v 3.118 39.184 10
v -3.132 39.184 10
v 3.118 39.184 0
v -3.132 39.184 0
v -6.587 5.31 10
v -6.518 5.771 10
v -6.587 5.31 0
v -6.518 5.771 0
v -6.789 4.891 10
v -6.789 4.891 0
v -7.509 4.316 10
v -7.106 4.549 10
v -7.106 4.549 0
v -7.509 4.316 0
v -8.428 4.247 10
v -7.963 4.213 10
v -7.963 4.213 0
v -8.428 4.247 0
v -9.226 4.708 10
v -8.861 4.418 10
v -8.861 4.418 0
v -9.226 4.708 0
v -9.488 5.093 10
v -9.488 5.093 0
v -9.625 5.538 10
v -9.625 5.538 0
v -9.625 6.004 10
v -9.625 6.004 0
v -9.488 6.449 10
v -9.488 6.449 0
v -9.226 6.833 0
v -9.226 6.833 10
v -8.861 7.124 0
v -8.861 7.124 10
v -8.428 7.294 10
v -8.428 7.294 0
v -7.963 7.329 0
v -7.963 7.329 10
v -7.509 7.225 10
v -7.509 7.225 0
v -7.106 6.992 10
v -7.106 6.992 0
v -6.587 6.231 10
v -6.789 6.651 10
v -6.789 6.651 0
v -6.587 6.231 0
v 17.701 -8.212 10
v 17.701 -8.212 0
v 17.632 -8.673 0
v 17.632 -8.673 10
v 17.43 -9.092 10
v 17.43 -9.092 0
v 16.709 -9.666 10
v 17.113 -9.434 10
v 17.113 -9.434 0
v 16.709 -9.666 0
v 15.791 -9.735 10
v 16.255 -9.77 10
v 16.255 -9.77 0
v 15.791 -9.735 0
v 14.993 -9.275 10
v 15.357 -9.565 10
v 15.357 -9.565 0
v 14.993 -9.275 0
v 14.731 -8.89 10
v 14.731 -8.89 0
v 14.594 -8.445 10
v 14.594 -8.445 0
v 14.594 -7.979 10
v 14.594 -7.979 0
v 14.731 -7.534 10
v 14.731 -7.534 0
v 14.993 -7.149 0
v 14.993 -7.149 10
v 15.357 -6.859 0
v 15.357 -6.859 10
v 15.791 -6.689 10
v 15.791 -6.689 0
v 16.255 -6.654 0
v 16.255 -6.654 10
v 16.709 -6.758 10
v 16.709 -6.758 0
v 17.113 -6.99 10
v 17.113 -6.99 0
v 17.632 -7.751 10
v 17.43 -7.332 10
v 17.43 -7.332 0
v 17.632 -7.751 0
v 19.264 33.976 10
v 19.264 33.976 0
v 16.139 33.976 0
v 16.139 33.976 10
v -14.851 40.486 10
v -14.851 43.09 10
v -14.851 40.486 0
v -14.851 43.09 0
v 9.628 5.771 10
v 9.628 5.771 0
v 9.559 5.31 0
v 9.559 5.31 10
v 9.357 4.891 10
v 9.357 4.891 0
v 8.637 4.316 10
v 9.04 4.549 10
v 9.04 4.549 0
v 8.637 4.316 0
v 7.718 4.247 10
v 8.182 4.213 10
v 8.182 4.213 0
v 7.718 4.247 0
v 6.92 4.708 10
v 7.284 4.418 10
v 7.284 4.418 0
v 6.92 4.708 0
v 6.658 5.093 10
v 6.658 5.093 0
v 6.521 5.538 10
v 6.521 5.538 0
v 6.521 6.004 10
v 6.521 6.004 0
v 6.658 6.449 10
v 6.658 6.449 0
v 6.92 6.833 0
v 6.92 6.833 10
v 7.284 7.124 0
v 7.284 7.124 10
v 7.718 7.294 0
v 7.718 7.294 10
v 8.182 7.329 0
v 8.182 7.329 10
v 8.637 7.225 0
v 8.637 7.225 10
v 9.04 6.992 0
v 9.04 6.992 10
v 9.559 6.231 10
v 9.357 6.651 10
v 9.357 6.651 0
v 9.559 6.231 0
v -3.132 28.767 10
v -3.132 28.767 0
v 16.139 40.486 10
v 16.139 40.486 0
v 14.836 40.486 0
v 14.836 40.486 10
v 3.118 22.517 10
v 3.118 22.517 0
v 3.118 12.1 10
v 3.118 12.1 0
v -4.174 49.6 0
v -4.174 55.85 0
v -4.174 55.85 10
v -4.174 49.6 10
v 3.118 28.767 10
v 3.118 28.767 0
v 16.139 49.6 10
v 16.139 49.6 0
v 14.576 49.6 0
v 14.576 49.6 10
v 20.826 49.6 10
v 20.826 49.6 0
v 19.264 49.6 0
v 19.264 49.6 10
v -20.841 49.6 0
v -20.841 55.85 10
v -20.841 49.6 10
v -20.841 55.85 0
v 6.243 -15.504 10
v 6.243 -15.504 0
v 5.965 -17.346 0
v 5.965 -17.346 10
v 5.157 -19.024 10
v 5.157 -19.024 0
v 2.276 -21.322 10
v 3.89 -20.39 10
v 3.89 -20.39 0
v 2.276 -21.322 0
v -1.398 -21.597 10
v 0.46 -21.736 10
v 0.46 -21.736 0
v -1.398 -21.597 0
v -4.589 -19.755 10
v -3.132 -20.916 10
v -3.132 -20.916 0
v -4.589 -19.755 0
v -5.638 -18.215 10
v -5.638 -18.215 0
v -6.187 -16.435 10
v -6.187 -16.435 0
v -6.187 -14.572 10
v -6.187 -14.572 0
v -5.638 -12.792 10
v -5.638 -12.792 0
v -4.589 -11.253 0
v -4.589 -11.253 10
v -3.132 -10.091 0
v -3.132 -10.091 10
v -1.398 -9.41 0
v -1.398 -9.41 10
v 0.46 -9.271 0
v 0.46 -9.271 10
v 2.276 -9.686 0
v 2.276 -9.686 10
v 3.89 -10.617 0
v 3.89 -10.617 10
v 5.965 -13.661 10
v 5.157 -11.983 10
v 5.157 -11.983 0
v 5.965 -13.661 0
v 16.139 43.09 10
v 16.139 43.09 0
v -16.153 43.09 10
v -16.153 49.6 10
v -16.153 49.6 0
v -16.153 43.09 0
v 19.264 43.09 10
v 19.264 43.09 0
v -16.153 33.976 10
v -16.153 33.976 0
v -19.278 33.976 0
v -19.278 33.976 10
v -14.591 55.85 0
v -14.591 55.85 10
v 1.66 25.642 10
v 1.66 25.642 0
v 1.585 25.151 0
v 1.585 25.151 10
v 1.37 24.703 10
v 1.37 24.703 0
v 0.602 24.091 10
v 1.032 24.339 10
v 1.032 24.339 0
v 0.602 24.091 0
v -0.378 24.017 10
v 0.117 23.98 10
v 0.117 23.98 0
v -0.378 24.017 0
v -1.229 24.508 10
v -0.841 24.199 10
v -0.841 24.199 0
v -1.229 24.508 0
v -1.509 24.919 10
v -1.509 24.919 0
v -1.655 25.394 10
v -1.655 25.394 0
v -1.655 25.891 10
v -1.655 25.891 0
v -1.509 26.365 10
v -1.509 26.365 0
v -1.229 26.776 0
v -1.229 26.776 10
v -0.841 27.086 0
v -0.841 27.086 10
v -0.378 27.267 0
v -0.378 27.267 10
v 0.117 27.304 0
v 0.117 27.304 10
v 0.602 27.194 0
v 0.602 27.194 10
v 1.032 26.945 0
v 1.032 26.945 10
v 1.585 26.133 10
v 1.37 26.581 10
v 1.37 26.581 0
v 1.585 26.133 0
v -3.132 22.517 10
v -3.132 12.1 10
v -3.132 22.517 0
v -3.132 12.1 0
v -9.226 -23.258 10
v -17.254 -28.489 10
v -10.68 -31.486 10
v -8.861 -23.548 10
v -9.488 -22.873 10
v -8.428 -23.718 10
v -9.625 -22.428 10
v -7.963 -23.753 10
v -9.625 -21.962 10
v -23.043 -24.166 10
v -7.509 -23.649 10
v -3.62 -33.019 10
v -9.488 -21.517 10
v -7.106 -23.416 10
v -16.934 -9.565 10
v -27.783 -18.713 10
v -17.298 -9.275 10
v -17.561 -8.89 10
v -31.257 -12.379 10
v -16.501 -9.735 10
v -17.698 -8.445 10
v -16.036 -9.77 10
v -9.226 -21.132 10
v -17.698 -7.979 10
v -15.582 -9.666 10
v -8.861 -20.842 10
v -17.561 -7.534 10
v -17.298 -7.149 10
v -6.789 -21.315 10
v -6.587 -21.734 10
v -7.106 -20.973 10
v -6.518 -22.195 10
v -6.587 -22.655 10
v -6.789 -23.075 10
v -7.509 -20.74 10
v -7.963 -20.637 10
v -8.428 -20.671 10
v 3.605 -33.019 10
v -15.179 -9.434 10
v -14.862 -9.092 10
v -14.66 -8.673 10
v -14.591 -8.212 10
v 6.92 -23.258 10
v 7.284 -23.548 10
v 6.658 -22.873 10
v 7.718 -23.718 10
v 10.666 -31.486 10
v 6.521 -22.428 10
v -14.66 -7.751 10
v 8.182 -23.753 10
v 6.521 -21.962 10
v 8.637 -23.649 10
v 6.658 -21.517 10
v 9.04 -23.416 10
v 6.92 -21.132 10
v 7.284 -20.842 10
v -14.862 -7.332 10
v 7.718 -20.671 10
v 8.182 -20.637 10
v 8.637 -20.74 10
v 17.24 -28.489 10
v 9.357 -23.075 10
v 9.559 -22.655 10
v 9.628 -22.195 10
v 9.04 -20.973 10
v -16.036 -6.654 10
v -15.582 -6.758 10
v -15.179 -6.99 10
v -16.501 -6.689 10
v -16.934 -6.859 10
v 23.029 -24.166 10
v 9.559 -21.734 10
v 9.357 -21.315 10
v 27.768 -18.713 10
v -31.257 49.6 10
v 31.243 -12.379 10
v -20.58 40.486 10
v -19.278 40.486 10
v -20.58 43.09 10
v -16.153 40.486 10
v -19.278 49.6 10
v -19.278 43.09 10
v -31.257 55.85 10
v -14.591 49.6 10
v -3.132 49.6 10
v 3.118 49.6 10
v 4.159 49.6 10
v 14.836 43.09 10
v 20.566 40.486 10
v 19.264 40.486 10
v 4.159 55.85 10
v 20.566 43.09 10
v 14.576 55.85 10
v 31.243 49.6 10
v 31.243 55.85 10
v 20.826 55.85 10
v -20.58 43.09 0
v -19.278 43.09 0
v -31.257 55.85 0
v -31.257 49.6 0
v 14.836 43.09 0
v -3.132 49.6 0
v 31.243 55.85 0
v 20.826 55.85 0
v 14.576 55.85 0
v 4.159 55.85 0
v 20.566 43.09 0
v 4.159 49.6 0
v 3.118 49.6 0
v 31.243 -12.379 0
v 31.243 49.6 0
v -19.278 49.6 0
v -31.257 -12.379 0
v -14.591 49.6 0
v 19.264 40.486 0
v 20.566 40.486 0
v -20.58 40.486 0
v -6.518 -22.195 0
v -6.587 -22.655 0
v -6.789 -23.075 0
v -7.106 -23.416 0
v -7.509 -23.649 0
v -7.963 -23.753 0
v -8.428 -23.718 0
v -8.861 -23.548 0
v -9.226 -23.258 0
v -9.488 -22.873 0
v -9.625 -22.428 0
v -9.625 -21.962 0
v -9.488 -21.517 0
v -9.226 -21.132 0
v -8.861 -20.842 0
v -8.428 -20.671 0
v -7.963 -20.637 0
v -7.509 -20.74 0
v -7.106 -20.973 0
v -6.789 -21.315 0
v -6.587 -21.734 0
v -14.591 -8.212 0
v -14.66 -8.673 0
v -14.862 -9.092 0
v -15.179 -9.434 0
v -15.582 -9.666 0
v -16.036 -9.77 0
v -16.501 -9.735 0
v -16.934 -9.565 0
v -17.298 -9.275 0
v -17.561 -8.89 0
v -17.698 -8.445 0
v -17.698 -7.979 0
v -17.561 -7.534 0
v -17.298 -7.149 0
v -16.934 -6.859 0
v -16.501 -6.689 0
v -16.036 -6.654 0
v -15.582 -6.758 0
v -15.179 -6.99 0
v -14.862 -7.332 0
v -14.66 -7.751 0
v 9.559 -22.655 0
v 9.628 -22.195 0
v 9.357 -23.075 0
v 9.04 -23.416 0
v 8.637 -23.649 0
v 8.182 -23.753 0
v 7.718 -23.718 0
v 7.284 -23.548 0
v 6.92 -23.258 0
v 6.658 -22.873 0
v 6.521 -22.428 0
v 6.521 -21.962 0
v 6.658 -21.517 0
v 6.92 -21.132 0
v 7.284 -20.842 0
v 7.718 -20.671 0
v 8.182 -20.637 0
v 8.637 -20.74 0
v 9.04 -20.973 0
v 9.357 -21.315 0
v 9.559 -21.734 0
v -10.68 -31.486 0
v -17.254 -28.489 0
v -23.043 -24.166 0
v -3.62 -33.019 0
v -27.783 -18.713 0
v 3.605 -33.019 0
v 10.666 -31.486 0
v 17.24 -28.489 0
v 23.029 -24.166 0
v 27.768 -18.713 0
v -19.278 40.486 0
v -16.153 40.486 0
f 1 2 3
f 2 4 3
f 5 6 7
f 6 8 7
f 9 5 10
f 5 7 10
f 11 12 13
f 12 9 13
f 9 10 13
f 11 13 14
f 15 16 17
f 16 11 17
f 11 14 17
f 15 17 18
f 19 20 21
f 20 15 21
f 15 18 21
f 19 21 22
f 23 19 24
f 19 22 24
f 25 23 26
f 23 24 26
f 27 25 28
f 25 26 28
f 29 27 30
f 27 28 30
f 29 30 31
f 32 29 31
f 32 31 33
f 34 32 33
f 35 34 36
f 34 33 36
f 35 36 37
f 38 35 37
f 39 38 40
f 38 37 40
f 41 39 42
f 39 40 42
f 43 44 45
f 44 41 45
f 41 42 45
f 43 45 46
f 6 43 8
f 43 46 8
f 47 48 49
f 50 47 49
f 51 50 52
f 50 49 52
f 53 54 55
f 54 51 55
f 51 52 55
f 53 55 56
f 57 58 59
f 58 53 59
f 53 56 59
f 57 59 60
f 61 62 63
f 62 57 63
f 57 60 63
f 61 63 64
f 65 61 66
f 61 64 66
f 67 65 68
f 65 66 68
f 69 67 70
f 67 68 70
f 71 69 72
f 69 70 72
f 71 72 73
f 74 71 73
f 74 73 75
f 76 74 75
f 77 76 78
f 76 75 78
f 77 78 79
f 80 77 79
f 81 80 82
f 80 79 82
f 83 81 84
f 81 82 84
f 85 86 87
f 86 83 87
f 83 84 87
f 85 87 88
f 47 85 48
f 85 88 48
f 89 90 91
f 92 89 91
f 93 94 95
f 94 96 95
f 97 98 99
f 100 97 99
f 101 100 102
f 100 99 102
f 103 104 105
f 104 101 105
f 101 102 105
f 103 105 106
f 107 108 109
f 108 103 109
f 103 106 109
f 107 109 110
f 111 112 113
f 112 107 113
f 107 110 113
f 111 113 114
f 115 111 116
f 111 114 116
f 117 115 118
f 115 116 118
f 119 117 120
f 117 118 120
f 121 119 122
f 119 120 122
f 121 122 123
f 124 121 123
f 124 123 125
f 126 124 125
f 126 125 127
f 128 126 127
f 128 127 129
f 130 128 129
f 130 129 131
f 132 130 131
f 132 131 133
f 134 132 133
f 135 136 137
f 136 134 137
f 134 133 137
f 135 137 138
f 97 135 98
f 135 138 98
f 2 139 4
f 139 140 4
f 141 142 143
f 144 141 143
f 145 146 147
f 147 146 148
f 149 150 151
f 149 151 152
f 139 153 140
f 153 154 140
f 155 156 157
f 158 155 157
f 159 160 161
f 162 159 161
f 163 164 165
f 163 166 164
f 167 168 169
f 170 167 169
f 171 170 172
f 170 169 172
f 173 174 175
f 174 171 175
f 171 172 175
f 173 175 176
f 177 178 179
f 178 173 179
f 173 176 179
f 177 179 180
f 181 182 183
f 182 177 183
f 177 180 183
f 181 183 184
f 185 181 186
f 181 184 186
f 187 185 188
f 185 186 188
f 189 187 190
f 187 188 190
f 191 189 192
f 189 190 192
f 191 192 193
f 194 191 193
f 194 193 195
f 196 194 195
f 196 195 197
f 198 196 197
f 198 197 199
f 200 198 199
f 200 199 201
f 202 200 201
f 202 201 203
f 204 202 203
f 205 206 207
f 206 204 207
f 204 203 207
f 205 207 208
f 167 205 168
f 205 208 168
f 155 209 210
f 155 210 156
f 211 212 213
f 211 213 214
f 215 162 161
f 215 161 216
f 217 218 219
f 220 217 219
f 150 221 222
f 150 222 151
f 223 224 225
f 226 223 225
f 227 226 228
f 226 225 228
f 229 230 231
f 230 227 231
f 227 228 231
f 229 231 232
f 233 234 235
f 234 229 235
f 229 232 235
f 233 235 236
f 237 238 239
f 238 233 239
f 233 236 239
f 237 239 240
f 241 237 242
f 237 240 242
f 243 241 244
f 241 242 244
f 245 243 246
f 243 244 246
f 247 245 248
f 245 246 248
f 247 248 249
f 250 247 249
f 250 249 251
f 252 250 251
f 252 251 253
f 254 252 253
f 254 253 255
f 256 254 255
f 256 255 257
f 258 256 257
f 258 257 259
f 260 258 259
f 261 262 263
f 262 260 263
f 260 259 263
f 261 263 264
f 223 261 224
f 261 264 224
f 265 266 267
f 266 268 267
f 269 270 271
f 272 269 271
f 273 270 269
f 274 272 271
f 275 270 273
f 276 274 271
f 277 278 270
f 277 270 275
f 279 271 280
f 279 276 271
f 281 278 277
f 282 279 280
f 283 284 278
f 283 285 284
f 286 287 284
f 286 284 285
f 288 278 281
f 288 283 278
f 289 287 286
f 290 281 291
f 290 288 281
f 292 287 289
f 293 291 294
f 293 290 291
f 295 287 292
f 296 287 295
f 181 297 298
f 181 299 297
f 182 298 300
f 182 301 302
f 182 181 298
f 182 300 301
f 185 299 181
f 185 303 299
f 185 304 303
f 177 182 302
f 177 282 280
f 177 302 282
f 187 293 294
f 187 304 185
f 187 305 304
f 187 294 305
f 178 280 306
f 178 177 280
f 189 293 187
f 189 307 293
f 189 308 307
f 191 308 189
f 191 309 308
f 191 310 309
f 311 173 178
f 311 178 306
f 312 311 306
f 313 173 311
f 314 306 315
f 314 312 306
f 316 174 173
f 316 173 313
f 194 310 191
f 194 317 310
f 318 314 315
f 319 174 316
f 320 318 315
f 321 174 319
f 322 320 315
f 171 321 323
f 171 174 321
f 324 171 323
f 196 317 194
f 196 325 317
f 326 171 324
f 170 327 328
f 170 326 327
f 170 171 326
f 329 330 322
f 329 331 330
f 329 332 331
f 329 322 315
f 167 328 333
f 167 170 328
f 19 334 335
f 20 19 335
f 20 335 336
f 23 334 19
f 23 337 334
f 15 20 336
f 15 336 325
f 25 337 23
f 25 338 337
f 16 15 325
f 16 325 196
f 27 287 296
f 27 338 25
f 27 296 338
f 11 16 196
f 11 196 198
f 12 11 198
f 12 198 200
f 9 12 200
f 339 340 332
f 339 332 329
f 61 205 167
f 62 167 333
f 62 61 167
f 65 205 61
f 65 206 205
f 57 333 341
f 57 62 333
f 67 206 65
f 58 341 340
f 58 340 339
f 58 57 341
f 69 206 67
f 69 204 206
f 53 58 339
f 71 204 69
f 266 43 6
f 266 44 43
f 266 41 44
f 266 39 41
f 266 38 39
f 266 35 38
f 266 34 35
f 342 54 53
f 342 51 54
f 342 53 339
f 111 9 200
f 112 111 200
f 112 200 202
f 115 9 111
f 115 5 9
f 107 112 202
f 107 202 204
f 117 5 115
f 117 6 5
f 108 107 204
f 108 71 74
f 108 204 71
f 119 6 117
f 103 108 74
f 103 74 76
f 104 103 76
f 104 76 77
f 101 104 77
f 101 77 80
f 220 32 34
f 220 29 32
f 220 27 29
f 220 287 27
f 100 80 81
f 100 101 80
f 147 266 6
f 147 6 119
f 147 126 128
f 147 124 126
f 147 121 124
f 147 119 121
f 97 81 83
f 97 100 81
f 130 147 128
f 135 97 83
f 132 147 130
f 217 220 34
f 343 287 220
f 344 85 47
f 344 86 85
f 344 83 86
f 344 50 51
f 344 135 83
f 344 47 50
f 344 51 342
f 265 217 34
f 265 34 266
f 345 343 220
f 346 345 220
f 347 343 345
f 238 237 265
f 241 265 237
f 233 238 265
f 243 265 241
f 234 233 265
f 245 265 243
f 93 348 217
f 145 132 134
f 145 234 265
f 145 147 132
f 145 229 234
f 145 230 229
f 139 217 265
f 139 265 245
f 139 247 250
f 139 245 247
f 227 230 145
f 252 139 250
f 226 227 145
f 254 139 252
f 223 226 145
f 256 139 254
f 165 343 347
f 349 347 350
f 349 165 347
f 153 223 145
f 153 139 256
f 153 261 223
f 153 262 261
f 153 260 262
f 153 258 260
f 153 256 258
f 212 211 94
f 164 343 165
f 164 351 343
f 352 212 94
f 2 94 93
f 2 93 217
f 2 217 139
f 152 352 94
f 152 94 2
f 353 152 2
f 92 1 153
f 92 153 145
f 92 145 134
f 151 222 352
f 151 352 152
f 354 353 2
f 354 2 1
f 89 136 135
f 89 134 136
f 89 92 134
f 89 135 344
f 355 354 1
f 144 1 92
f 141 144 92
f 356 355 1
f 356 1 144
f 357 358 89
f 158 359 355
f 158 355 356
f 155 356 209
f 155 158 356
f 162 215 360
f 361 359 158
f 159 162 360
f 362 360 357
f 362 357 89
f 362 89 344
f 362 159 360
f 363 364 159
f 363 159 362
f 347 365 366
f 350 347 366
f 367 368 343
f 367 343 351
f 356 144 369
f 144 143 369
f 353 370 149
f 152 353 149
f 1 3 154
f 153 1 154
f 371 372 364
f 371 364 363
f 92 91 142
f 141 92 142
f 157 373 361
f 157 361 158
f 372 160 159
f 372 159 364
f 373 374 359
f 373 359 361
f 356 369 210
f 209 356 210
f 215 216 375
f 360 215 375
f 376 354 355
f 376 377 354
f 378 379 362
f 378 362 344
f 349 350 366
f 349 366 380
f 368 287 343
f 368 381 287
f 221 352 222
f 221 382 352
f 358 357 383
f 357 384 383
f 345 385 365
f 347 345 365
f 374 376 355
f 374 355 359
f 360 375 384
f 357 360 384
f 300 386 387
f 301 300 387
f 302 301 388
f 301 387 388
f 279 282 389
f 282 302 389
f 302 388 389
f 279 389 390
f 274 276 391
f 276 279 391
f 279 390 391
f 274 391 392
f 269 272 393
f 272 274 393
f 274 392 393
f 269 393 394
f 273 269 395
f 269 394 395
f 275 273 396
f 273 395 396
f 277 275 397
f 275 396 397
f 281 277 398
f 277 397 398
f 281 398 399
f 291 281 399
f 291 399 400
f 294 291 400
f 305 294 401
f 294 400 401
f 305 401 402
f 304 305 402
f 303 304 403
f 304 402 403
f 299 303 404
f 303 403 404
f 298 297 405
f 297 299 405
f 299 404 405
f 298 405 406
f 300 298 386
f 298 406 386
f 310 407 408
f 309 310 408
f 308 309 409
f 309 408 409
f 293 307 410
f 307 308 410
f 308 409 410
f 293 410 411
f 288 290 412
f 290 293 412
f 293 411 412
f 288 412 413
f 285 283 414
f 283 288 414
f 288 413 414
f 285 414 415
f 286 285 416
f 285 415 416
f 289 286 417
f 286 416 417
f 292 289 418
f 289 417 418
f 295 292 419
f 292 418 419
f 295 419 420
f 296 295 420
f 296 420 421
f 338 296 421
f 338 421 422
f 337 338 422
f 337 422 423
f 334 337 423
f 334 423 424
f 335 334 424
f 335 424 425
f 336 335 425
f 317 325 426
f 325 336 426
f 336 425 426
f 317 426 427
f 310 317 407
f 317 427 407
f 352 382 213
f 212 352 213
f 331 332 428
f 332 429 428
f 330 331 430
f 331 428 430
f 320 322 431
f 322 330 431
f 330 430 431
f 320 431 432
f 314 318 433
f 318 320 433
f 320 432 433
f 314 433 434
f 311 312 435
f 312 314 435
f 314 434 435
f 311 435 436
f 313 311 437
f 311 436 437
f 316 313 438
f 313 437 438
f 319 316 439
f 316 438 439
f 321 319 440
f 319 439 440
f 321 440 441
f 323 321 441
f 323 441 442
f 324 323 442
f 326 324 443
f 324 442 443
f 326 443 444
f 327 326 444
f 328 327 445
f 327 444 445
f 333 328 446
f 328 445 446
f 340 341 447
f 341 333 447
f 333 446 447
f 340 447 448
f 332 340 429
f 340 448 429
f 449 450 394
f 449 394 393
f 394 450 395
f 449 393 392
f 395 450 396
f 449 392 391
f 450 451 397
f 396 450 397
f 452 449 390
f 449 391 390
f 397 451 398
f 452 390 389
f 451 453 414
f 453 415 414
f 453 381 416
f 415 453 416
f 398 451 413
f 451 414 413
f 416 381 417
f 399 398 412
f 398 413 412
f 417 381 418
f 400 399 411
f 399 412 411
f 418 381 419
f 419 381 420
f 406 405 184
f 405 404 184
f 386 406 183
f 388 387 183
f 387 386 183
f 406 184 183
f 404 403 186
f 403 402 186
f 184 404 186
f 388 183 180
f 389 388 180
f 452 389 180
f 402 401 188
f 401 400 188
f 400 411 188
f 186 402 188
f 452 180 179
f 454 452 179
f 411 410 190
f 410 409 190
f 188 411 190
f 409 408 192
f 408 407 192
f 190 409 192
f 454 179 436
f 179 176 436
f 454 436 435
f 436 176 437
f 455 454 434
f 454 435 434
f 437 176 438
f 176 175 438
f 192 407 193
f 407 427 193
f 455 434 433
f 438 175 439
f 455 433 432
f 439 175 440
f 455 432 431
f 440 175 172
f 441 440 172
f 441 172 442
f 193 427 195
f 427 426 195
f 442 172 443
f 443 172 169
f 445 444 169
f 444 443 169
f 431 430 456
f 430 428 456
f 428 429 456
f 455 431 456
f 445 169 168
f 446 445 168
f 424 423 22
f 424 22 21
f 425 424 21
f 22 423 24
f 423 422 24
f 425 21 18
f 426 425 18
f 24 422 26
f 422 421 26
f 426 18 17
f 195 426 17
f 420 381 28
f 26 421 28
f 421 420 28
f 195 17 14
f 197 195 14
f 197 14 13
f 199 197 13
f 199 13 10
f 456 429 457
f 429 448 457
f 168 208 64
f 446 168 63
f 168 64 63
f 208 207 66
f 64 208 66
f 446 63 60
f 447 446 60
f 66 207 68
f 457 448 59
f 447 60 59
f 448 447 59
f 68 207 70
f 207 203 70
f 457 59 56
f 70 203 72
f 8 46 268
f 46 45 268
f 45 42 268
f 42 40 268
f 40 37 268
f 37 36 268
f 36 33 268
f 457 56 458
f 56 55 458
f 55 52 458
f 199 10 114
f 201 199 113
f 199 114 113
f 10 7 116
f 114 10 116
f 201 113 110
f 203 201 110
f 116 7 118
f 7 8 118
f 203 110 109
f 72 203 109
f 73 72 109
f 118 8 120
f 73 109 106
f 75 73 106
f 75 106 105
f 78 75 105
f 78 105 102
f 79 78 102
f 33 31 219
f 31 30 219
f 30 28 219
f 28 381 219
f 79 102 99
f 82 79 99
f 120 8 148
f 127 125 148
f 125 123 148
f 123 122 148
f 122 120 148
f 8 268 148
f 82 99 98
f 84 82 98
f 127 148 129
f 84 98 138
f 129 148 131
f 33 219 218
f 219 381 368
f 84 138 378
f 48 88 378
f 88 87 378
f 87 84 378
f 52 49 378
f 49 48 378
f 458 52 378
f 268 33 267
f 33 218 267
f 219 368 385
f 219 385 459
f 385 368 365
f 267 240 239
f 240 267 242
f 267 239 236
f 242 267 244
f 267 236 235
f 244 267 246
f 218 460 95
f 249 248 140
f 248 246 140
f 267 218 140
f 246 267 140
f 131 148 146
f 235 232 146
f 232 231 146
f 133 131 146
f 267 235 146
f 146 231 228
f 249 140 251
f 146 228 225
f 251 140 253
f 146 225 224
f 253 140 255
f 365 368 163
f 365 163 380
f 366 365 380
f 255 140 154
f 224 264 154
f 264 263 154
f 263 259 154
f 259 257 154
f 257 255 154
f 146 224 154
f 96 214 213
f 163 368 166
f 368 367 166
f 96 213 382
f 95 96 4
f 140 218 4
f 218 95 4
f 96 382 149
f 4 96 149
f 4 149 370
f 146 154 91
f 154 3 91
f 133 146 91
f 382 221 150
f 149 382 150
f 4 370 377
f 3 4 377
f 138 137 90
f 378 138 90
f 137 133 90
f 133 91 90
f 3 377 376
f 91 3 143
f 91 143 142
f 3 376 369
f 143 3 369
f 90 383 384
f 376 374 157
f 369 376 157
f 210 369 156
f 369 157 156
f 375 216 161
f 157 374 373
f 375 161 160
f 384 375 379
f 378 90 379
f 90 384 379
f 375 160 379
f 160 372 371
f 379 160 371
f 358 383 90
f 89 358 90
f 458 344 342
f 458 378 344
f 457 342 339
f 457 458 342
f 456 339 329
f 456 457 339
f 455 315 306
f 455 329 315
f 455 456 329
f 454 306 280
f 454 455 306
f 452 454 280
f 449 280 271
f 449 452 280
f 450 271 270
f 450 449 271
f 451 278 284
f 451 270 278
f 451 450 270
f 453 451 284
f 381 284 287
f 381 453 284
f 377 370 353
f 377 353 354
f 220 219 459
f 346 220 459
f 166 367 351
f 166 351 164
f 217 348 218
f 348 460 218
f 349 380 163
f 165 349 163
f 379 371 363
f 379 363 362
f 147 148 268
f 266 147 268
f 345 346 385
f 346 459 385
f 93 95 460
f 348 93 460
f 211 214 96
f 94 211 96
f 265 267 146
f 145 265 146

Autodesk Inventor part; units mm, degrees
ref_plane "YZ Plane" through (0, 0, 0) normal (1, 0, 0) x (0, 1, 0)
ref_plane "XZ Plane" through (0, 0, 0) normal (0, 1, 0) x (-1, 0, 0)
ref_plane "XY Plane" through (0, 0, 0) normal (0, 0, 1) x (1, 0, 0)
sketch "0" plane through (0, 0, 0) normal (0, 0, 1) x (1, 0, 0)
  line L0 (4.1594, 49.6005) -> (4.1594, 55.8505)
  line L1 (4.1594, 55.8505) -> (14.5761, 55.8505)
  line L2 (14.5761, 55.8505) -> (14.5761, 49.6005)
  line L3 (20.8261, 49.6005) -> (19.2636, 49.6005)
  line L4 (19.2636, 49.6005) -> (19.2636, 43.09)
  line L5 (19.2636, 33.9755) -> (16.1386, 33.9755)
  line L6 (16.1386, 33.9755) -> (16.1386, 40.4859)
  line L7 (14.8365, 43.09) -> (16.1386, 43.09)
  line L8 (20.5657, 43.09) -> (20.5657, 40.4859)
  line L9 (20.5657, 40.4859) -> (19.2636, 40.4859)
  line L10 (14.8365, 40.4859) -> (14.8365, 43.09)
  line L11 (16.1386, 43.09) -> (16.1386, 49.6005)
  line L12 (16.1386, 40.4859) -> (14.8365, 40.4859)
  line L13 (19.2636, 43.09) -> (20.5657, 43.09)
  line L14 (16.1386, 49.6005) -> (14.5761, 49.6005)
  line L15 (20.8261, 55.8505) -> (31.2428, 55.8505)
  line L16 (20.8261, 49.6005) -> (20.8261, 55.8505)
  line L17 (31.2428, 55.8505) -> (31.2428, 49.6005)
  line L18 (19.2636, 40.4859) -> (19.2636, 33.9755)
  line L19 (-31.2572, 49.6005) -> (-31.2572, 55.8505)
  line L20 (-31.2572, 55.8505) -> (-20.8406, 55.8505)
  line L21 (-14.5906, 55.8505) -> (-4.1739, 55.8505)
  line L22 (-4.1739, 55.8505) -> (-4.1739, 49.6005)
  line L23 (-3.1322, 49.6005) -> (-4.1739, 49.6005)
  line L24 (3.1178, 49.6005) -> (4.1594, 49.6005)
  line L25 (-20.8406, 55.8505) -> (-20.8406, 49.6005)
  line L26 (-14.5906, 49.6005) -> (-16.1531, 49.6005)
  line L27 (-16.1531, 49.6005) -> (-16.1531, 43.09)
  line L28 (-16.1531, 33.9755) -> (-19.2781, 33.9755)
  line L29 (-19.2781, 33.9755) -> (-19.2781, 40.4859)
  line L30 (-20.5802, 43.09) -> (-19.2781, 43.09)
  line L31 (-14.851, 43.09) -> (-14.851, 40.4859)
  line L32 (-14.851, 40.4859) -> (-16.1531, 40.4859)
  line L33 (-20.5802, 40.4859) -> (-20.5802, 43.09)
  line L34 (-19.2781, 43.09) -> (-19.2781, 49.6005)
  line L35 (-19.2781, 40.4859) -> (-20.5802, 40.4859)
  line L36 (-16.1531, 43.09) -> (-14.851, 43.09)
  line L37 (-19.2781, 49.6005) -> (-20.8406, 49.6005)
  line L38 (-14.5906, 49.6005) -> (-14.5906, 55.8505)
  line L39 (-16.1531, 40.4859) -> (-16.1531, 33.9755)
  arc A0 (-31.2572, -12.3787) -> (31.2428, -12.3787) centre (-0.0072, 0.6421) ccw
  circle A1 centre (8.0657, 5.7707) radius 1.5625
  circle A2 centre (-8.0802, 5.7707) radius 1.5625
  circle A3 centre (-16.1531, -8.212) radius 1.5625
  circle A4 centre (-8.0802, -22.1948) radius 1.5625
  circle A5 centre (8.0657, -22.1948) radius 1.5625
  circle A6 centre (16.1386, -8.212) radius 1.5625
  circle A7 centre (-0.0072, -15.5037) radius 6.25
  line L40 (31.2428, 49.6005) -> (31.2428, -12.3787)
  line L41 (-31.2572, -12.3787) -> (-31.2572, 49.6005)
  line L42 (-3.1322, 12.1005) -> (-3.1322, 22.5171)
  line L43 (-3.1322, 22.5171) -> (3.1178, 22.5171)
  line L44 (3.1178, 22.5171) -> (3.1178, 12.1005)
  line L45 (3.1178, 12.1005) -> (-3.1322, 12.1005)
  line L46 (-3.1322, 28.7671) -> (-3.1322, 39.1838)
  line L47 (3.1178, 39.1838) -> (3.1178, 28.7671)
  line L48 (3.1178, 28.7671) -> (-3.1322, 28.7671)
  circle A8 centre (-0.0072, 25.6421) radius 1.6667
  line L49 (-3.1322, 39.1838) -> (3.1178, 39.1838)
  line L50 (-3.1322, 49.6005) -> (3.1178, 49.6005)
  dimension "d0" = 12.5
sketch "Эскиз3" plane through (0, 0, 0) normal (0, 0, 1) x (1, 0, 0)
  circle A0 centre (-0.0072, -15.5037) radius 6.25
  circle A1 centre (-16.1531, -8.212) radius 1.5625
  circle A2 centre (-8.0802, 5.7707) radius 1.5625
  circle A3 centre (8.0657, 5.7707) radius 1.5625
  circle A4 centre (16.1386, -8.212) radius 1.5625
  circle A5 centre (8.0657, -22.1948) radius 1.5625
  circle A6 centre (-8.0802, -22.1948) radius 1.5625
  arc A7 (-31.2572, -12.3787) -> (31.2428, -12.3787) centre (-0.0072, 0.6421) ccw
  line L0 (-31.2572, -12.3787) -> (-31.2572, 49.6005)
  line L1 (-31.2572, 49.6005) -> (-31.2572, 55.8505)
  line L2 (-31.2572, 55.8505) -> (-20.8406, 55.8505)
  line L3 (-20.8406, 55.8505) -> (-20.8406, 49.6005)
  line L4 (-19.2781, 49.6005) -> (-20.8406, 49.6005)
  line L5 (-19.2781, 43.09) -> (-19.2781, 49.6005)
  line L6 (-20.5802, 43.09) -> (-19.2781, 43.09)
  line L7 (-20.5802, 40.4859) -> (-20.5802, 43.09)
  line L8 (-19.2781, 40.4859) -> (-20.5802, 40.4859)
  line L9 (-19.2781, 33.9755) -> (-19.2781, 40.4859)
  line L10 (-16.1531, 33.9755) -> (-19.2781, 33.9755)
  line L11 (-16.1531, 40.4859) -> (-16.1531, 33.9755)
  line L12 (-14.851, 40.4859) -> (-16.1531, 40.4859)
  line L13 (-14.851, 43.09) -> (-14.851, 40.4859)
  line L14 (-16.1531, 43.09) -> (-14.851, 43.09)
  line L15 (-16.1531, 49.6005) -> (-16.1531, 43.09)
  line L16 (-14.5906, 49.6005) -> (-16.1531, 49.6005)
  line L17 (-14.5906, 49.6005) -> (-14.5906, 55.8505)
  line L18 (-14.5906, 55.8505) -> (-4.1739, 55.8505)
  line L19 (-4.1739, 55.8505) -> (-4.1739, 49.6005)
  line L20 (-3.1322, 49.6005) -> (3.1178, 49.6005)
  line L21 (3.1178, 49.6005) -> (4.1594, 49.6005)
  line L22 (-3.1322, 49.6005) -> (-4.1739, 49.6005)
  line L23 (4.1594, 49.6005) -> (4.1594, 55.8505)
  line L24 (4.1594, 55.8505) -> (14.5761, 55.8505)
  line L25 (14.5761, 55.8505) -> (14.5761, 49.6005)
  line L26 (16.1386, 49.6005) -> (14.5761, 49.6005)
  line L27 (16.1386, 43.09) -> (16.1386, 49.6005)
  line L28 (14.8365, 43.09) -> (16.1386, 43.09)
  line L29 (14.8365, 40.4859) -> (14.8365, 43.09)
  line L30 (16.1386, 40.4859) -> (14.8365, 40.4859)
  line L31 (16.1386, 33.9755) -> (16.1386, 40.4859)
  line L32 (19.2636, 33.9755) -> (16.1386, 33.9755)
  line L33 (19.2636, 40.4859) -> (19.2636, 33.9755)
  line L34 (20.5657, 40.4859) -> (19.2636, 40.4859)
  line L35 (20.5657, 43.09) -> (20.5657, 40.4859)
  line L36 (19.2636, 43.09) -> (20.5657, 43.09)
  line L37 (19.2636, 49.6005) -> (19.2636, 43.09)
  line L38 (20.8261, 49.6005) -> (19.2636, 49.6005)
  line L39 (20.8261, 49.6005) -> (20.8261, 55.8505)
  line L40 (20.8261, 55.8505) -> (31.2428, 55.8505)
  line L41 (31.2428, 49.6005) -> (31.2428, -12.3787)
  line L42 (3.1178, 22.5171) -> (3.1178, 12.1005)
  circle A8 centre (-0.0072, 25.6421) radius 1.6667
  line L43 (3.1178, 28.7671) -> (-3.1322, 28.7671)
  line L44 (-3.1322, 28.7671) -> (-3.1322, 39.1838)
  line L45 (-3.1322, 39.1838) -> (3.1178, 39.1838)
  line L46 (3.1178, 39.1838) -> (3.1178, 28.7671)
  line L47 (-3.1322, 22.5171) -> (3.1178, 22.5171)
  line L48 (-3.1322, 12.1005) -> (-3.1322, 22.5171)
  line L49 (3.1178, 12.1005) -> (-3.1322, 12.1005)
  line L50 (31.2428, 55.8505) -> (31.2428, 49.6005)
  line L51 (31.2428, 55.8505) -> (31.2428, -12.3787)
  line L52 (20.8261, 55.8505) -> (31.2428, 55.8505)
  line L53 (20.8261, 55.8505) -> (20.8261, 49.6005)
  line L54 (19.2636, 49.6005) -> (20.8261, 49.6005)
  line L55 (19.2636, 43.09) -> (19.2636, 49.6005)
  line L56 (20.5657, 43.09) -> (19.2636, 43.09)
  line L57 (20.5657, 43.09) -> (20.5657, 40.4859)
  line L58 (20.5657, 40.4859) -> (19.2636, 40.4859)
  line L59 (19.2636, 40.4859) -> (19.2636, 33.9755)
  line L60 (16.1386, 33.9755) -> (19.2636, 33.9755)
  line L61 (16.1386, 40.4859) -> (16.1386, 33.8824)
  line L62 (14.8365, 40.4859) -> (16.1386, 40.4859)
  line L63 (14.8365, 43.09) -> (14.8365, 40.4859)
  line L64 (16.1386, 43.09) -> (14.8365, 43.09)
  line L65 (16.1386, 49.6005) -> (16.1386, 43.09)
  line L66 (16.1386, 49.6005) -> (14.5761, 49.6005)
  line L67 (14.5761, 49.6005) -> (14.5761, 55.8505)
  line L68 (4.1594, 55.8505) -> (14.5761, 55.8505)
  line L69 (4.1594, 55.8505) -> (4.1594, 49.6005)
  line L70 (-3.1322, 39.1838) -> (3.1178, 39.1838)
  line L71 (3.1178, 39.1838) -> (3.1178, 28.7671)
  line L72 (3.1178, 28.7671) -> (-3.1322, 28.7671)
  line L73 (-3.1322, 28.7671) -> (-3.1322, 39.1838)
  line L74 (-3.1322, 22.5171) -> (3.1178, 22.5171)
  line L75 (3.1178, 22.5171) -> (3.1178, 12.1005)
  line L76 (3.1178, 12.1005) -> (-3.1322, 12.1005)
  line L77 (-3.1322, 12.1005) -> (-3.1322, 22.5171)
  circle A9 centre (-0.0072, -15.5037) radius 6.25
  circle A10 centre (16.1386, -8.212) radius 1.5625
  circle A11 centre (8.0657, 5.7707) radius 1.5625
  circle A12 centre (8.0657, -22.1948) radius 1.5625
  circle A13 centre (-8.0802, 5.7707) radius 1.5625
  circle A14 centre (-16.1531, -8.212) radius 1.5625
  circle A15 centre (-8.0802, -22.1948) radius 1.5625
  line L78 (-14.5906, 55.8505) -> (-14.5906, 49.6005)
  line L79 (-20.8406, 49.6005) -> (-20.8406, 55.8505)
  line L80 (-14.851, 43.09) -> (-14.851, 40.4859)
  line L81 (-20.5802, 40.4859) -> (-20.5802, 43.09)
  line L82 (-16.1531, 33.9755) -> (-19.2781, 33.9755)
  line L83 (-20.8406, 55.8505) -> (-20.5802, 55.8505)
  line L84 (-14.851, 55.8505) -> (-14.5906, 55.8505)
  line L85 (-14.5906, 49.6005) -> (-16.1531, 49.6005)
  line L86 (-19.2781, 49.6005) -> (-20.8406, 49.6005)
  line L87 (-19.2781, 33.9755) -> (-19.2781, 40.4859)
  line L88 (-19.2781, 43.09) -> (-19.2781, 49.6005)
  line L89 (-16.1531, 49.6005) -> (-16.1531, 43.09)
  line L90 (-16.1531, 40.4859) -> (-16.1531, 33.9755)
  line L91 (-20.5802, 43.09) -> (-19.2781, 43.09)
  line L92 (-16.1531, 43.09) -> (-14.851, 43.09)
  line L93 (-14.851, 40.4859) -> (-16.1531, 40.4859)
  line L94 (-19.2781, 40.4859) -> (-20.5802, 40.4859)
  line L95 (-31.2572, 55.8505) -> (-31.2572, -12.3787)
  line L96 (-31.2572, 55.8505) -> (-20.5802, 55.8505)
  line L97 (-14.851, 55.8505) -> (-4.1739, 55.8505)
  line L98 (-4.1739, 55.8505) -> (-4.1739, 49.6005)
  line L99 (-4.1739, 49.6005) -> (4.1594, 49.6005)
  circle A16 centre (-0.0072, 25.6421) radius 1.6667
  arc A17 (-31.2572, -12.3787) -> (31.2428, -12.3787) centre (-0.0072, 0.6421) ccw
  point P0 (0, 0)
  point P1 (-0.0072, 12.1005)
  point P2 (3.1178, 17.3088)
  dimension "d1" = 33.8542
  dimension "d2" = 12.5
extrude "Выдавливание1" add sketch "Эскиз3" along normal blind 10
properties part number "Крепление_мотора1_платформа"
